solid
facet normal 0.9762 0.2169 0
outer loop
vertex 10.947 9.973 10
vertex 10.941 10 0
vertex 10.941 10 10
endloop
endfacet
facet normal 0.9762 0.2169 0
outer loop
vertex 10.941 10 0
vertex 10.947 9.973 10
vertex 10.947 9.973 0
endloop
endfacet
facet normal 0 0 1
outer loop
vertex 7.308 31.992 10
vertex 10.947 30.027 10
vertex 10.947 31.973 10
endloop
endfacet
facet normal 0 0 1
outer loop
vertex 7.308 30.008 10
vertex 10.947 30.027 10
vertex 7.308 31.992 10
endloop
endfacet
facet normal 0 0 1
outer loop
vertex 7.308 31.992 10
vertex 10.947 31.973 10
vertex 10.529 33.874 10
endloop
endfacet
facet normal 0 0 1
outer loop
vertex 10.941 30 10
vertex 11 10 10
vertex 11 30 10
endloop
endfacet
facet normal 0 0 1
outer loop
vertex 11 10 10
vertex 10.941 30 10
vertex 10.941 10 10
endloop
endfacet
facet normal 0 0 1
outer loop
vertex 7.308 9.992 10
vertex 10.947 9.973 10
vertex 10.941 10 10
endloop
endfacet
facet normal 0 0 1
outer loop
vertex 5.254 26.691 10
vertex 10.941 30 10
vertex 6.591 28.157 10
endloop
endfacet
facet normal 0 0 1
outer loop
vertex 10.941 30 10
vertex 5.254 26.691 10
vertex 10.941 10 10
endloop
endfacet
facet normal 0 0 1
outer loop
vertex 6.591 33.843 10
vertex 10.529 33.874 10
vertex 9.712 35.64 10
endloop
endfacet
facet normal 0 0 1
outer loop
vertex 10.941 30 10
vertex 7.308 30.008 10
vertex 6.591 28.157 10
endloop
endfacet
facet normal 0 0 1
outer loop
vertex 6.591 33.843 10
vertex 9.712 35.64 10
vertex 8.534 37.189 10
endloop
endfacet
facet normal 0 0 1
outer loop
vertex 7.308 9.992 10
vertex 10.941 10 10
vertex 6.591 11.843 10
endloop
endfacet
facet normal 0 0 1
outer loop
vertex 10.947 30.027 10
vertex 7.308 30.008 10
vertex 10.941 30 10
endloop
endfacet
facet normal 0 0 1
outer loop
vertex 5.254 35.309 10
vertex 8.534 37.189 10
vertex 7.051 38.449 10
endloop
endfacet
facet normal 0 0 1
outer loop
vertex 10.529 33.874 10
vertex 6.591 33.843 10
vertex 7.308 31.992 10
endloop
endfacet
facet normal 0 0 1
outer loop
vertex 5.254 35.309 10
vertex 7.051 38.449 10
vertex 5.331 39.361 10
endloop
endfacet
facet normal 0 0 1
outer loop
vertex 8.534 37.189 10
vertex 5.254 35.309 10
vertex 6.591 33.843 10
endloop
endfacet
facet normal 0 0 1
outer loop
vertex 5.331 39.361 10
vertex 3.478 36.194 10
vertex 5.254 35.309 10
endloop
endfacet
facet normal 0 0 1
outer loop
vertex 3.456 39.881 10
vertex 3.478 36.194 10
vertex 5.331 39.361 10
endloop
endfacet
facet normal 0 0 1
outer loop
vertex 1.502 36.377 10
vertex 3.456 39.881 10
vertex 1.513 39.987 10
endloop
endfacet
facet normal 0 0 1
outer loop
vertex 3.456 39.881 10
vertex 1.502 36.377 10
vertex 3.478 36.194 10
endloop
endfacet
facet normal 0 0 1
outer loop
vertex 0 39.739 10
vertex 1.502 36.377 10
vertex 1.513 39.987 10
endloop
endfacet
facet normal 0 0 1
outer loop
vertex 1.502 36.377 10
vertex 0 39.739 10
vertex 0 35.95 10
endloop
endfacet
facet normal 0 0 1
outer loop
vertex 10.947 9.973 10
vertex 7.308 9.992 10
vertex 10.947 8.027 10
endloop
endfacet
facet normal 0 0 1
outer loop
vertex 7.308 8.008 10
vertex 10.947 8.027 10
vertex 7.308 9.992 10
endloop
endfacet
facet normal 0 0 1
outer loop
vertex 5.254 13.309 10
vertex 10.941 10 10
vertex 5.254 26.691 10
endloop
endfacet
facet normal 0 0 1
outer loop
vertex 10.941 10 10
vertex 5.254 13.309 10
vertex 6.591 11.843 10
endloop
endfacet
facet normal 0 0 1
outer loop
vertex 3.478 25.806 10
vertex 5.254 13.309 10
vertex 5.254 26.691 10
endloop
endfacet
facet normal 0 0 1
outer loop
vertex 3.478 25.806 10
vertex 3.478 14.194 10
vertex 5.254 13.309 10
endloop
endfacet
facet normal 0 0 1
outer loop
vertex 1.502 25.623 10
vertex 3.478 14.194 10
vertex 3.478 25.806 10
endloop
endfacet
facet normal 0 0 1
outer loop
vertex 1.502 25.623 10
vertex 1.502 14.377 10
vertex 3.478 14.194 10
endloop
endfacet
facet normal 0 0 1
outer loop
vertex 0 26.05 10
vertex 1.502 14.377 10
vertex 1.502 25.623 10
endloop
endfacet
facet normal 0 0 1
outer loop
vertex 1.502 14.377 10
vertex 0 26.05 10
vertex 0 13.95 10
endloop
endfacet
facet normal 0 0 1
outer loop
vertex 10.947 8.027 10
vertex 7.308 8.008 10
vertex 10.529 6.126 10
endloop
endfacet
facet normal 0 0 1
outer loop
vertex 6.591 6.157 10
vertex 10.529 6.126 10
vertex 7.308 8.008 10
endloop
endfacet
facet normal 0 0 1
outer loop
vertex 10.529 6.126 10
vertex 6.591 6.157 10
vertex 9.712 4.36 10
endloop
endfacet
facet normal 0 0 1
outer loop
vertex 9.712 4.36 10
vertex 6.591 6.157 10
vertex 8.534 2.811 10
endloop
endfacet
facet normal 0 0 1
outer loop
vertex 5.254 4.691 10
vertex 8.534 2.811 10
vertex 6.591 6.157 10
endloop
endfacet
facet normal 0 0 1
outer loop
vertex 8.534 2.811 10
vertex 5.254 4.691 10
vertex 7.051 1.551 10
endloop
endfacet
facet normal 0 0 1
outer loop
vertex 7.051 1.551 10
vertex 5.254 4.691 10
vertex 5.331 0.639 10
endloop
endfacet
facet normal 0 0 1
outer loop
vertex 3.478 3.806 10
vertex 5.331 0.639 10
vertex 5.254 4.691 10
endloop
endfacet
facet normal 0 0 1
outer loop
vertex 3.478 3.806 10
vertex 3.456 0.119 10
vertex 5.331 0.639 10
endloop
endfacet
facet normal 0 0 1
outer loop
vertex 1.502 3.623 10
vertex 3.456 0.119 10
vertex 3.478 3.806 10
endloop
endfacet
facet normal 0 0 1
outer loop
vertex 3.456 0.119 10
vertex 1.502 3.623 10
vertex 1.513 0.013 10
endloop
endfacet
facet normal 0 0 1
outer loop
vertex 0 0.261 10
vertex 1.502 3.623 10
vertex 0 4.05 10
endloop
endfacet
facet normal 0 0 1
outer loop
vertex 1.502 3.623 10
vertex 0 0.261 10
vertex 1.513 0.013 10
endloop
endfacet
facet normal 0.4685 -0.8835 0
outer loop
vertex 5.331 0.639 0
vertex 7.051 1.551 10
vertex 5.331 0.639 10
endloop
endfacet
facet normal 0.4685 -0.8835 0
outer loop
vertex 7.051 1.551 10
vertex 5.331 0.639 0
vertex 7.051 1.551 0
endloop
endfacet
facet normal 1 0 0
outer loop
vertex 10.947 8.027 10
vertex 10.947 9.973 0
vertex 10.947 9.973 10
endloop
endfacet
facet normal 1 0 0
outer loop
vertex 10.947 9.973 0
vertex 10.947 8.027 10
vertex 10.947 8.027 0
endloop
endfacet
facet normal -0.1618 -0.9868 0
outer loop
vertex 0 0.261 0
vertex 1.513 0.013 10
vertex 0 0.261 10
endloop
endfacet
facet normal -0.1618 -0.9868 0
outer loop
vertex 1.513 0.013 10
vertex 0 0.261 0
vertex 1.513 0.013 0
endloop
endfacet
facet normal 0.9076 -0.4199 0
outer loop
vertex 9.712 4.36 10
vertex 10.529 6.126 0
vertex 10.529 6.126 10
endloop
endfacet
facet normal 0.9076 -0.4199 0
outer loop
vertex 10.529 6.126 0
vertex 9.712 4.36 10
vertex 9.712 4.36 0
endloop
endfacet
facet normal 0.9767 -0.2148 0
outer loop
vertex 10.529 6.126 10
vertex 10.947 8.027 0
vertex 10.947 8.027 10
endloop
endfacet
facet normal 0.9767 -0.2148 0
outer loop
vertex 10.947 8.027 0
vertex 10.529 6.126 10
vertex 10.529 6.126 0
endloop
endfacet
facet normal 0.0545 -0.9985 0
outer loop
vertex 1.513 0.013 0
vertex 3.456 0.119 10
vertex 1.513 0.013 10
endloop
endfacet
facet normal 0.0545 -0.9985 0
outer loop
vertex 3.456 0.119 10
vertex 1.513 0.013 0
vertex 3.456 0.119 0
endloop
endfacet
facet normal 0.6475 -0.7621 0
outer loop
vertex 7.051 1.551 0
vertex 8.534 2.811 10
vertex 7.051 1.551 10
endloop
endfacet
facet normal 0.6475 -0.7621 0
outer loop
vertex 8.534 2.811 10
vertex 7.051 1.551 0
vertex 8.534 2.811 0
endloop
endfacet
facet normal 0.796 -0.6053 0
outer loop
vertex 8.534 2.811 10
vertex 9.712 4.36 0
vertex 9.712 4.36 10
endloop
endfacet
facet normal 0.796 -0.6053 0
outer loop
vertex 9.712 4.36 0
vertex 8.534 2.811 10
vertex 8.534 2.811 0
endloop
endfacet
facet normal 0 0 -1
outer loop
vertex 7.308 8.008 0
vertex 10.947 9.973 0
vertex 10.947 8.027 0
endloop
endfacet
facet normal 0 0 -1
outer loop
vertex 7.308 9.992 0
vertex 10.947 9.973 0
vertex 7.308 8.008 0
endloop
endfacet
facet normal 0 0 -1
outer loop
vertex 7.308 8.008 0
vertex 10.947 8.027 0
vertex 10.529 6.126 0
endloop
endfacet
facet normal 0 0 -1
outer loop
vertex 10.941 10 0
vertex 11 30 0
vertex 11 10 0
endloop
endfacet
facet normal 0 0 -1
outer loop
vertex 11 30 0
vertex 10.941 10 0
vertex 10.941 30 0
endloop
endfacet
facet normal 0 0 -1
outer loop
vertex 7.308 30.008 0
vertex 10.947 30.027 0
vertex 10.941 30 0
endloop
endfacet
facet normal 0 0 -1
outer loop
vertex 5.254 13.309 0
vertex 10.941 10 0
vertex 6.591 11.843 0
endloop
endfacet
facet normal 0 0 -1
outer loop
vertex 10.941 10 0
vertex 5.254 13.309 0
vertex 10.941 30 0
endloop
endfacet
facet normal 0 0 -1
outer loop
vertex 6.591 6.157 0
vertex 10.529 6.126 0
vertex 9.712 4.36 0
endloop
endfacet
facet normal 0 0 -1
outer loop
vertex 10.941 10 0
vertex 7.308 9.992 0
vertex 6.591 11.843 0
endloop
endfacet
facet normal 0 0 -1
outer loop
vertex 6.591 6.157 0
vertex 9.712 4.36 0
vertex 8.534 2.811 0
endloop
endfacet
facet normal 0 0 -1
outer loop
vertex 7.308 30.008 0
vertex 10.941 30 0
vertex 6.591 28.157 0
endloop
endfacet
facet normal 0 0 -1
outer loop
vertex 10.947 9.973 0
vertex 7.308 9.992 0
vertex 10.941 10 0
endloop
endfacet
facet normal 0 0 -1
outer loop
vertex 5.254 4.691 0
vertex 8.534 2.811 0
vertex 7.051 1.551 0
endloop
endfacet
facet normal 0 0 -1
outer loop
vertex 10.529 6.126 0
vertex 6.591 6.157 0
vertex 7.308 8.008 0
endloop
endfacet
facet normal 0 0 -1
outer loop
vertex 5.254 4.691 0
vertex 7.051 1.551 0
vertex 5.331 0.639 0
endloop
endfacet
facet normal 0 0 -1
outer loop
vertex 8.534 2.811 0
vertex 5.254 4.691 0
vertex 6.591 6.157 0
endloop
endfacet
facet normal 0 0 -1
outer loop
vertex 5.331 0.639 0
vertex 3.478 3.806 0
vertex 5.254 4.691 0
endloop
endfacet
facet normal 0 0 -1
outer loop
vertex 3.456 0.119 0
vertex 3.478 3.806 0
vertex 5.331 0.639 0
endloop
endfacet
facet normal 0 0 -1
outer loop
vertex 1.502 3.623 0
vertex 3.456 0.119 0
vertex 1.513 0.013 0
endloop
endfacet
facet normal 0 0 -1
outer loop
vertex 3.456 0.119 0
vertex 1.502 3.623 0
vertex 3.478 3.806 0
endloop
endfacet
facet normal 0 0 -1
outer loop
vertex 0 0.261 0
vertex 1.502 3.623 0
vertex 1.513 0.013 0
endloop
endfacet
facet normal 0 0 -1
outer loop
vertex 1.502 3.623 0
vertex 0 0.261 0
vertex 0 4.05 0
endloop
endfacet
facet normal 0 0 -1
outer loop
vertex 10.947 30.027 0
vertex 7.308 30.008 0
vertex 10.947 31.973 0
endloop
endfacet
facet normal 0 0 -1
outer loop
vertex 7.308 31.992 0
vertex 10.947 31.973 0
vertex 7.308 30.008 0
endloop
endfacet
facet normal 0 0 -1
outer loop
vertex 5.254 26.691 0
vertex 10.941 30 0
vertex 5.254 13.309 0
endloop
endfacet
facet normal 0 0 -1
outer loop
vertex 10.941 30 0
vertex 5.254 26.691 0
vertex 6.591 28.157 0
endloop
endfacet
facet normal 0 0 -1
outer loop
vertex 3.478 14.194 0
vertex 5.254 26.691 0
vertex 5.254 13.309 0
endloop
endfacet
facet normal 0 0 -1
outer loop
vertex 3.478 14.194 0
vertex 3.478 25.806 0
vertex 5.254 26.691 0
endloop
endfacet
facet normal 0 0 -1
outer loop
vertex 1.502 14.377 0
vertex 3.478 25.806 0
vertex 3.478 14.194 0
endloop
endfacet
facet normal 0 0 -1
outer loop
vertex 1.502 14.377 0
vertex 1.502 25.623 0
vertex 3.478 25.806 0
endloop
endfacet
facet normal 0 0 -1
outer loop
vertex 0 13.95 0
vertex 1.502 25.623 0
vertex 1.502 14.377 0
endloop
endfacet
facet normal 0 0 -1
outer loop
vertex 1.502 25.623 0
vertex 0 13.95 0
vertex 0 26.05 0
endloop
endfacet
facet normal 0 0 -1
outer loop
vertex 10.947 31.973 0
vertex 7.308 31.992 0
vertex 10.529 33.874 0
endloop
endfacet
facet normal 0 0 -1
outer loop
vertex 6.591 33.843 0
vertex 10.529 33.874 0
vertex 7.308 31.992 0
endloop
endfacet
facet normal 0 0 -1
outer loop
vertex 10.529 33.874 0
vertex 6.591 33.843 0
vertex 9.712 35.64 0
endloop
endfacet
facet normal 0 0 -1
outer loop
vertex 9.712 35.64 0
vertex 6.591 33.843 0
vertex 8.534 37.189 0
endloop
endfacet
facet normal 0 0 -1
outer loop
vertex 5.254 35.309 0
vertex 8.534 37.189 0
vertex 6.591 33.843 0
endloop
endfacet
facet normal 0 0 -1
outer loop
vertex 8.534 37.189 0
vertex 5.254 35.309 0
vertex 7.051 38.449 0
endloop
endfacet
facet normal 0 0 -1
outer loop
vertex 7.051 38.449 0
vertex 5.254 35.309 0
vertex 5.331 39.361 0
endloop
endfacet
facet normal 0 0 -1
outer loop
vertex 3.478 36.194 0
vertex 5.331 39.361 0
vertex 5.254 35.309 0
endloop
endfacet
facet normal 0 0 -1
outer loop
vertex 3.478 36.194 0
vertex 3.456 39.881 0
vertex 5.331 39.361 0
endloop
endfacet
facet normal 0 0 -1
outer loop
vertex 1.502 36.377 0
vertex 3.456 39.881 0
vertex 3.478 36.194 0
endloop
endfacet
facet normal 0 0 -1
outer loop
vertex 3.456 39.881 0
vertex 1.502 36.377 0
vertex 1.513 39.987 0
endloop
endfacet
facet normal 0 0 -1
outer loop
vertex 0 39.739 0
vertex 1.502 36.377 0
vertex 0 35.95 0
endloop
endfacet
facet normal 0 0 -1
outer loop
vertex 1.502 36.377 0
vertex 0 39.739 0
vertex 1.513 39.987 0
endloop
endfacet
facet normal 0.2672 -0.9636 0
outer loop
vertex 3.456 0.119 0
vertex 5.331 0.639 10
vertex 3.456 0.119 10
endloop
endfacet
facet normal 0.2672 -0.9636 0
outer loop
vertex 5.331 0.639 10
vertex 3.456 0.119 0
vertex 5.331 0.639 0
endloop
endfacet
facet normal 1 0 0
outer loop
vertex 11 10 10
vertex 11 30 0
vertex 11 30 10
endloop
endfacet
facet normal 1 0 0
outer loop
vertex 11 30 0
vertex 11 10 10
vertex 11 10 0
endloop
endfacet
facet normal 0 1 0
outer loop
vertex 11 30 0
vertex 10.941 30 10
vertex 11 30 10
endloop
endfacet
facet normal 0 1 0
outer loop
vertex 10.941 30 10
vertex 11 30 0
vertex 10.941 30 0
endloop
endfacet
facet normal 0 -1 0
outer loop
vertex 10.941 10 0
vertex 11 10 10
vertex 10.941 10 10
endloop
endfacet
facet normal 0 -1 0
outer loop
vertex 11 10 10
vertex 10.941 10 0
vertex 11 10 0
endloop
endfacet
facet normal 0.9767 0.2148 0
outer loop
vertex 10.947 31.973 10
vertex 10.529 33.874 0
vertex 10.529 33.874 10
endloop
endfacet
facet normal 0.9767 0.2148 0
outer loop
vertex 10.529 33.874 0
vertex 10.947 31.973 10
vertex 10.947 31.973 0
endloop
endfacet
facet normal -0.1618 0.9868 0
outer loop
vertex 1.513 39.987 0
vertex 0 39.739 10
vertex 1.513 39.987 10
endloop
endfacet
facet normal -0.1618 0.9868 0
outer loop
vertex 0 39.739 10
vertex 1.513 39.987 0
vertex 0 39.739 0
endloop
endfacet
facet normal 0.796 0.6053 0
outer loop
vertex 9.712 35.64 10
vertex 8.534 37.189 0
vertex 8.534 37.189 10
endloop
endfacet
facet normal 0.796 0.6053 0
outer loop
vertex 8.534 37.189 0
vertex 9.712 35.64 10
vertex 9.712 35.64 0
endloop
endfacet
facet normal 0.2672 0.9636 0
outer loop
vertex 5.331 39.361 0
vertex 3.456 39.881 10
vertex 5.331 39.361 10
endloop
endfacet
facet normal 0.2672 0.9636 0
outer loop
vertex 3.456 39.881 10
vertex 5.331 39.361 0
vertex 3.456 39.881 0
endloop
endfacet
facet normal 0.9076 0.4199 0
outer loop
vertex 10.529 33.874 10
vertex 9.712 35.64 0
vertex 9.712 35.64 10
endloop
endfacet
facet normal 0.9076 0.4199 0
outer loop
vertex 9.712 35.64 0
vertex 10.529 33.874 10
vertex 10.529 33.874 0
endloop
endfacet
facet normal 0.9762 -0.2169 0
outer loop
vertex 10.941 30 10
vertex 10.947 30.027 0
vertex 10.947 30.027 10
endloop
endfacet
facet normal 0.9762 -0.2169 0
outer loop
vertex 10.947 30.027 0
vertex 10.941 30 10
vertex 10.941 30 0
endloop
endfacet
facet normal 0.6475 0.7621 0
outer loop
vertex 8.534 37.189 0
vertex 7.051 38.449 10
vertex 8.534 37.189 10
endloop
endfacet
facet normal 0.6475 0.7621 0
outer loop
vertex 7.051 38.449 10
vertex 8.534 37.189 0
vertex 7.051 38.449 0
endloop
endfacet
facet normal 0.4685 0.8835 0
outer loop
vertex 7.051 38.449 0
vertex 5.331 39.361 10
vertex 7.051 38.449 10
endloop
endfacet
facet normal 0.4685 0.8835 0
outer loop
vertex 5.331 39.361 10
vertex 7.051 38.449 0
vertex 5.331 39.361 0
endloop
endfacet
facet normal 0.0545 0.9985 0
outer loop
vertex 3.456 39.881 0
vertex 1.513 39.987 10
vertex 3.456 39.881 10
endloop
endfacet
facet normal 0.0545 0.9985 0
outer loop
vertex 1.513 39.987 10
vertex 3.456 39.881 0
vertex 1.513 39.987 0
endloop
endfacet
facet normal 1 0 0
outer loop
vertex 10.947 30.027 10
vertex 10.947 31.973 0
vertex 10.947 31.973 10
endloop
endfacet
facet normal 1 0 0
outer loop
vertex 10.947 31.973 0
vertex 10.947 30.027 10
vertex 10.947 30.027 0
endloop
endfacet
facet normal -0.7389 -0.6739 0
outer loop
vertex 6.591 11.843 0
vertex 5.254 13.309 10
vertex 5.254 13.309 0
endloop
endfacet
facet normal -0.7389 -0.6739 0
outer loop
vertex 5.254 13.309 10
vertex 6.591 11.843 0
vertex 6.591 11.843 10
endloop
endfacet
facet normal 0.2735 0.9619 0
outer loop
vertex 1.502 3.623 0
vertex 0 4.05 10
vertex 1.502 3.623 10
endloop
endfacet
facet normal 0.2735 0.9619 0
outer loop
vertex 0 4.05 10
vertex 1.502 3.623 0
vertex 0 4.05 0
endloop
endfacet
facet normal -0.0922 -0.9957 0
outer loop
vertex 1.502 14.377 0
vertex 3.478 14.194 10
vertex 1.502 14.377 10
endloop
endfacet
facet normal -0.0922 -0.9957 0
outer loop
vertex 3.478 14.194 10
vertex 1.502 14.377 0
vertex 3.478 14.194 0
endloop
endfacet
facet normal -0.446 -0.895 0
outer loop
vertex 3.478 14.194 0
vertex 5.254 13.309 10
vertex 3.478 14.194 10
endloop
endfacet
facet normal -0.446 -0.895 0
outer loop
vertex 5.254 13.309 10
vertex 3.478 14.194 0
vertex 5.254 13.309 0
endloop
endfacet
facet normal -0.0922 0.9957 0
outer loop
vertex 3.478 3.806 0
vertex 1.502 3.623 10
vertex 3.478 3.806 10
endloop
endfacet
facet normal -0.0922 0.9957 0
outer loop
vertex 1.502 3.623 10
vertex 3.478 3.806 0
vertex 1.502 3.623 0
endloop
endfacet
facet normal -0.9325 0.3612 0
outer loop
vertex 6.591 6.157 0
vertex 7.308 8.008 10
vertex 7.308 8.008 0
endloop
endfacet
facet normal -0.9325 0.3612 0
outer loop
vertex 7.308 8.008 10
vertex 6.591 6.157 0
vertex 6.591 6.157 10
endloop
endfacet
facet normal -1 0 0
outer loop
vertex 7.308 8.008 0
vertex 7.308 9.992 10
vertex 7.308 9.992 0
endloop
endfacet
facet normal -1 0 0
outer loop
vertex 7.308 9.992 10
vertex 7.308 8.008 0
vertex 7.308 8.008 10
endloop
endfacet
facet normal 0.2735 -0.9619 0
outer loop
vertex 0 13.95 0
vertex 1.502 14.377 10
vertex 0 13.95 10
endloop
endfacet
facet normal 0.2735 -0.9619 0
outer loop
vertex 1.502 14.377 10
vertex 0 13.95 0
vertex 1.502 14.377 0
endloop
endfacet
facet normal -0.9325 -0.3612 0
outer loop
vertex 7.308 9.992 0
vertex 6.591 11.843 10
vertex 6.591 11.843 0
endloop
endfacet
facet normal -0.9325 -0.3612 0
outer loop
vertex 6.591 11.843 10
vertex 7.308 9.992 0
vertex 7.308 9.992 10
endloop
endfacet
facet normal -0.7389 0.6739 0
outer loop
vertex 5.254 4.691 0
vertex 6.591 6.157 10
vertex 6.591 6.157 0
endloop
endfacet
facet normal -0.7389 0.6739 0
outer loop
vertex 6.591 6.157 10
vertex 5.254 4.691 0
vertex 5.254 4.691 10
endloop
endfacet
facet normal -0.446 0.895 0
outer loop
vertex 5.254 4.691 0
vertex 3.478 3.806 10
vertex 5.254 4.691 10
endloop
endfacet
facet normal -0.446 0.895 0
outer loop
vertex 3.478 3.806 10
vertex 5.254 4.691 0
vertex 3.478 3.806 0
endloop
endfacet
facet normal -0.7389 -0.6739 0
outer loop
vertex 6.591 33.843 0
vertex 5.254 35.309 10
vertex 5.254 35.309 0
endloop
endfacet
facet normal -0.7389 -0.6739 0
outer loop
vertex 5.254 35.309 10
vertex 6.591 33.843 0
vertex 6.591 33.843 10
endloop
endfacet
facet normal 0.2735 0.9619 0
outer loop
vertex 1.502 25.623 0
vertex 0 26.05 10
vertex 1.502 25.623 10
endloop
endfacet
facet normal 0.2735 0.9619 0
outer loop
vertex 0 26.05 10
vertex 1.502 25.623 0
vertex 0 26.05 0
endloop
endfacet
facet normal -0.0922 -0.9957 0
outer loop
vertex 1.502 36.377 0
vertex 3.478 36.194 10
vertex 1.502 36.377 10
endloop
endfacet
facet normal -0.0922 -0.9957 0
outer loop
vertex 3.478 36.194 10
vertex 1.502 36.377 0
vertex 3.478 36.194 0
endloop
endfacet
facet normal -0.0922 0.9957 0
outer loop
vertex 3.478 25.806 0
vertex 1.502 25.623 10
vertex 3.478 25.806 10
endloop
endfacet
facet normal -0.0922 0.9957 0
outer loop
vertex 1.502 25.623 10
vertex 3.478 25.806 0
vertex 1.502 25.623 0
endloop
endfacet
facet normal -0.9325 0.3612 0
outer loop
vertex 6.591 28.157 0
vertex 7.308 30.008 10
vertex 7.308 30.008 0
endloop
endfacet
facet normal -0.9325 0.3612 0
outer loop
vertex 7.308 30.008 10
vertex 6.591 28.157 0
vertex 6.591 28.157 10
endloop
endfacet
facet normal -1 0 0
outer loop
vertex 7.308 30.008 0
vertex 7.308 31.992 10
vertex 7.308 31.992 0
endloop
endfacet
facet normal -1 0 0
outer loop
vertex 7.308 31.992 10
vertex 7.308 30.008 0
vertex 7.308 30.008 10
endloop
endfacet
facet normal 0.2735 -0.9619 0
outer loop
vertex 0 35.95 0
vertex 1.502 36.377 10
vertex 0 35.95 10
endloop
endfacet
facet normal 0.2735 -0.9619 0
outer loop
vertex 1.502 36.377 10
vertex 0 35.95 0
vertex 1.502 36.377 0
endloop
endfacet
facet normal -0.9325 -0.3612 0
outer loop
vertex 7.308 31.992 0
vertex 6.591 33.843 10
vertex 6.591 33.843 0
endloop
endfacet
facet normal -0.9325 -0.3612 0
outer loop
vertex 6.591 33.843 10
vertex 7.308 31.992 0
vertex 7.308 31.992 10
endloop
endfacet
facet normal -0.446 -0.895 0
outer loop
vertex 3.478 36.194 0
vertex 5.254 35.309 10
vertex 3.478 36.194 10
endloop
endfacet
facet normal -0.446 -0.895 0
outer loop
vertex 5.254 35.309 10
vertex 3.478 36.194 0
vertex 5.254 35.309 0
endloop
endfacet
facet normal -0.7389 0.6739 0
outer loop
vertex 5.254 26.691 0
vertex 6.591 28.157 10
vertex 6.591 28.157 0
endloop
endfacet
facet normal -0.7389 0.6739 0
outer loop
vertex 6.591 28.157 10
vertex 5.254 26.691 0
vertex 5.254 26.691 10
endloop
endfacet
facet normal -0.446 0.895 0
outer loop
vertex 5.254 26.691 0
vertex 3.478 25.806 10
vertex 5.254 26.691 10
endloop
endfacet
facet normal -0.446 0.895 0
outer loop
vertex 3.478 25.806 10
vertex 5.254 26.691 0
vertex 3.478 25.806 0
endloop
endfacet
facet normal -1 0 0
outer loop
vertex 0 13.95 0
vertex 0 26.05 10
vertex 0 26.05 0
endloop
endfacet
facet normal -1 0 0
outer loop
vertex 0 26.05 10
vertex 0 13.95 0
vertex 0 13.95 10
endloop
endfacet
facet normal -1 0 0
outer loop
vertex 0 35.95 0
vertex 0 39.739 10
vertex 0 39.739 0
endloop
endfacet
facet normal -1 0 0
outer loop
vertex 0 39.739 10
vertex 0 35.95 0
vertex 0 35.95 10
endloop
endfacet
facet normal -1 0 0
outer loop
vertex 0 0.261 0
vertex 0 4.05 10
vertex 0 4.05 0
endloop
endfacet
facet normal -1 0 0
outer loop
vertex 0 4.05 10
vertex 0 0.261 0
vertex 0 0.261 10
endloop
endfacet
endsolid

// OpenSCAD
// PRUSA iteration3
// Y motor backing plate
// GNU GPL v3
// Josef Průša <iam@josefprusa.cz> and contributors
// http://www.reprap.org/wiki/Prusa_Mendel
// http://prusamendel.org

module y_motor_backing_base(){

 // Front holding part
 translate(v = [-2,10-1,0]) cylinder(h = 10, r=9);
 translate(v = [-2,20,5]) cube(size = [18,20,10], center=true);	
 translate(v = [-2,30+1,0]) cylinder(h = 10, r=9);
}

module y_motor_backing_holes(){
 translate(v = [-2,10-1,-1]) cylinder(h = 12, r=5.4);	
 translate(v = [-2,30+1,-1])cylinder(h = 12, r=5.4);
 cube([10,40,10]);
}

// Final part
module y_motor_backing(){
 mirror([1,0,0]) 
 difference(){
  y_motor_backing_base();
  y_motor_backing_holes();
 }
}

y_motor_backing();
